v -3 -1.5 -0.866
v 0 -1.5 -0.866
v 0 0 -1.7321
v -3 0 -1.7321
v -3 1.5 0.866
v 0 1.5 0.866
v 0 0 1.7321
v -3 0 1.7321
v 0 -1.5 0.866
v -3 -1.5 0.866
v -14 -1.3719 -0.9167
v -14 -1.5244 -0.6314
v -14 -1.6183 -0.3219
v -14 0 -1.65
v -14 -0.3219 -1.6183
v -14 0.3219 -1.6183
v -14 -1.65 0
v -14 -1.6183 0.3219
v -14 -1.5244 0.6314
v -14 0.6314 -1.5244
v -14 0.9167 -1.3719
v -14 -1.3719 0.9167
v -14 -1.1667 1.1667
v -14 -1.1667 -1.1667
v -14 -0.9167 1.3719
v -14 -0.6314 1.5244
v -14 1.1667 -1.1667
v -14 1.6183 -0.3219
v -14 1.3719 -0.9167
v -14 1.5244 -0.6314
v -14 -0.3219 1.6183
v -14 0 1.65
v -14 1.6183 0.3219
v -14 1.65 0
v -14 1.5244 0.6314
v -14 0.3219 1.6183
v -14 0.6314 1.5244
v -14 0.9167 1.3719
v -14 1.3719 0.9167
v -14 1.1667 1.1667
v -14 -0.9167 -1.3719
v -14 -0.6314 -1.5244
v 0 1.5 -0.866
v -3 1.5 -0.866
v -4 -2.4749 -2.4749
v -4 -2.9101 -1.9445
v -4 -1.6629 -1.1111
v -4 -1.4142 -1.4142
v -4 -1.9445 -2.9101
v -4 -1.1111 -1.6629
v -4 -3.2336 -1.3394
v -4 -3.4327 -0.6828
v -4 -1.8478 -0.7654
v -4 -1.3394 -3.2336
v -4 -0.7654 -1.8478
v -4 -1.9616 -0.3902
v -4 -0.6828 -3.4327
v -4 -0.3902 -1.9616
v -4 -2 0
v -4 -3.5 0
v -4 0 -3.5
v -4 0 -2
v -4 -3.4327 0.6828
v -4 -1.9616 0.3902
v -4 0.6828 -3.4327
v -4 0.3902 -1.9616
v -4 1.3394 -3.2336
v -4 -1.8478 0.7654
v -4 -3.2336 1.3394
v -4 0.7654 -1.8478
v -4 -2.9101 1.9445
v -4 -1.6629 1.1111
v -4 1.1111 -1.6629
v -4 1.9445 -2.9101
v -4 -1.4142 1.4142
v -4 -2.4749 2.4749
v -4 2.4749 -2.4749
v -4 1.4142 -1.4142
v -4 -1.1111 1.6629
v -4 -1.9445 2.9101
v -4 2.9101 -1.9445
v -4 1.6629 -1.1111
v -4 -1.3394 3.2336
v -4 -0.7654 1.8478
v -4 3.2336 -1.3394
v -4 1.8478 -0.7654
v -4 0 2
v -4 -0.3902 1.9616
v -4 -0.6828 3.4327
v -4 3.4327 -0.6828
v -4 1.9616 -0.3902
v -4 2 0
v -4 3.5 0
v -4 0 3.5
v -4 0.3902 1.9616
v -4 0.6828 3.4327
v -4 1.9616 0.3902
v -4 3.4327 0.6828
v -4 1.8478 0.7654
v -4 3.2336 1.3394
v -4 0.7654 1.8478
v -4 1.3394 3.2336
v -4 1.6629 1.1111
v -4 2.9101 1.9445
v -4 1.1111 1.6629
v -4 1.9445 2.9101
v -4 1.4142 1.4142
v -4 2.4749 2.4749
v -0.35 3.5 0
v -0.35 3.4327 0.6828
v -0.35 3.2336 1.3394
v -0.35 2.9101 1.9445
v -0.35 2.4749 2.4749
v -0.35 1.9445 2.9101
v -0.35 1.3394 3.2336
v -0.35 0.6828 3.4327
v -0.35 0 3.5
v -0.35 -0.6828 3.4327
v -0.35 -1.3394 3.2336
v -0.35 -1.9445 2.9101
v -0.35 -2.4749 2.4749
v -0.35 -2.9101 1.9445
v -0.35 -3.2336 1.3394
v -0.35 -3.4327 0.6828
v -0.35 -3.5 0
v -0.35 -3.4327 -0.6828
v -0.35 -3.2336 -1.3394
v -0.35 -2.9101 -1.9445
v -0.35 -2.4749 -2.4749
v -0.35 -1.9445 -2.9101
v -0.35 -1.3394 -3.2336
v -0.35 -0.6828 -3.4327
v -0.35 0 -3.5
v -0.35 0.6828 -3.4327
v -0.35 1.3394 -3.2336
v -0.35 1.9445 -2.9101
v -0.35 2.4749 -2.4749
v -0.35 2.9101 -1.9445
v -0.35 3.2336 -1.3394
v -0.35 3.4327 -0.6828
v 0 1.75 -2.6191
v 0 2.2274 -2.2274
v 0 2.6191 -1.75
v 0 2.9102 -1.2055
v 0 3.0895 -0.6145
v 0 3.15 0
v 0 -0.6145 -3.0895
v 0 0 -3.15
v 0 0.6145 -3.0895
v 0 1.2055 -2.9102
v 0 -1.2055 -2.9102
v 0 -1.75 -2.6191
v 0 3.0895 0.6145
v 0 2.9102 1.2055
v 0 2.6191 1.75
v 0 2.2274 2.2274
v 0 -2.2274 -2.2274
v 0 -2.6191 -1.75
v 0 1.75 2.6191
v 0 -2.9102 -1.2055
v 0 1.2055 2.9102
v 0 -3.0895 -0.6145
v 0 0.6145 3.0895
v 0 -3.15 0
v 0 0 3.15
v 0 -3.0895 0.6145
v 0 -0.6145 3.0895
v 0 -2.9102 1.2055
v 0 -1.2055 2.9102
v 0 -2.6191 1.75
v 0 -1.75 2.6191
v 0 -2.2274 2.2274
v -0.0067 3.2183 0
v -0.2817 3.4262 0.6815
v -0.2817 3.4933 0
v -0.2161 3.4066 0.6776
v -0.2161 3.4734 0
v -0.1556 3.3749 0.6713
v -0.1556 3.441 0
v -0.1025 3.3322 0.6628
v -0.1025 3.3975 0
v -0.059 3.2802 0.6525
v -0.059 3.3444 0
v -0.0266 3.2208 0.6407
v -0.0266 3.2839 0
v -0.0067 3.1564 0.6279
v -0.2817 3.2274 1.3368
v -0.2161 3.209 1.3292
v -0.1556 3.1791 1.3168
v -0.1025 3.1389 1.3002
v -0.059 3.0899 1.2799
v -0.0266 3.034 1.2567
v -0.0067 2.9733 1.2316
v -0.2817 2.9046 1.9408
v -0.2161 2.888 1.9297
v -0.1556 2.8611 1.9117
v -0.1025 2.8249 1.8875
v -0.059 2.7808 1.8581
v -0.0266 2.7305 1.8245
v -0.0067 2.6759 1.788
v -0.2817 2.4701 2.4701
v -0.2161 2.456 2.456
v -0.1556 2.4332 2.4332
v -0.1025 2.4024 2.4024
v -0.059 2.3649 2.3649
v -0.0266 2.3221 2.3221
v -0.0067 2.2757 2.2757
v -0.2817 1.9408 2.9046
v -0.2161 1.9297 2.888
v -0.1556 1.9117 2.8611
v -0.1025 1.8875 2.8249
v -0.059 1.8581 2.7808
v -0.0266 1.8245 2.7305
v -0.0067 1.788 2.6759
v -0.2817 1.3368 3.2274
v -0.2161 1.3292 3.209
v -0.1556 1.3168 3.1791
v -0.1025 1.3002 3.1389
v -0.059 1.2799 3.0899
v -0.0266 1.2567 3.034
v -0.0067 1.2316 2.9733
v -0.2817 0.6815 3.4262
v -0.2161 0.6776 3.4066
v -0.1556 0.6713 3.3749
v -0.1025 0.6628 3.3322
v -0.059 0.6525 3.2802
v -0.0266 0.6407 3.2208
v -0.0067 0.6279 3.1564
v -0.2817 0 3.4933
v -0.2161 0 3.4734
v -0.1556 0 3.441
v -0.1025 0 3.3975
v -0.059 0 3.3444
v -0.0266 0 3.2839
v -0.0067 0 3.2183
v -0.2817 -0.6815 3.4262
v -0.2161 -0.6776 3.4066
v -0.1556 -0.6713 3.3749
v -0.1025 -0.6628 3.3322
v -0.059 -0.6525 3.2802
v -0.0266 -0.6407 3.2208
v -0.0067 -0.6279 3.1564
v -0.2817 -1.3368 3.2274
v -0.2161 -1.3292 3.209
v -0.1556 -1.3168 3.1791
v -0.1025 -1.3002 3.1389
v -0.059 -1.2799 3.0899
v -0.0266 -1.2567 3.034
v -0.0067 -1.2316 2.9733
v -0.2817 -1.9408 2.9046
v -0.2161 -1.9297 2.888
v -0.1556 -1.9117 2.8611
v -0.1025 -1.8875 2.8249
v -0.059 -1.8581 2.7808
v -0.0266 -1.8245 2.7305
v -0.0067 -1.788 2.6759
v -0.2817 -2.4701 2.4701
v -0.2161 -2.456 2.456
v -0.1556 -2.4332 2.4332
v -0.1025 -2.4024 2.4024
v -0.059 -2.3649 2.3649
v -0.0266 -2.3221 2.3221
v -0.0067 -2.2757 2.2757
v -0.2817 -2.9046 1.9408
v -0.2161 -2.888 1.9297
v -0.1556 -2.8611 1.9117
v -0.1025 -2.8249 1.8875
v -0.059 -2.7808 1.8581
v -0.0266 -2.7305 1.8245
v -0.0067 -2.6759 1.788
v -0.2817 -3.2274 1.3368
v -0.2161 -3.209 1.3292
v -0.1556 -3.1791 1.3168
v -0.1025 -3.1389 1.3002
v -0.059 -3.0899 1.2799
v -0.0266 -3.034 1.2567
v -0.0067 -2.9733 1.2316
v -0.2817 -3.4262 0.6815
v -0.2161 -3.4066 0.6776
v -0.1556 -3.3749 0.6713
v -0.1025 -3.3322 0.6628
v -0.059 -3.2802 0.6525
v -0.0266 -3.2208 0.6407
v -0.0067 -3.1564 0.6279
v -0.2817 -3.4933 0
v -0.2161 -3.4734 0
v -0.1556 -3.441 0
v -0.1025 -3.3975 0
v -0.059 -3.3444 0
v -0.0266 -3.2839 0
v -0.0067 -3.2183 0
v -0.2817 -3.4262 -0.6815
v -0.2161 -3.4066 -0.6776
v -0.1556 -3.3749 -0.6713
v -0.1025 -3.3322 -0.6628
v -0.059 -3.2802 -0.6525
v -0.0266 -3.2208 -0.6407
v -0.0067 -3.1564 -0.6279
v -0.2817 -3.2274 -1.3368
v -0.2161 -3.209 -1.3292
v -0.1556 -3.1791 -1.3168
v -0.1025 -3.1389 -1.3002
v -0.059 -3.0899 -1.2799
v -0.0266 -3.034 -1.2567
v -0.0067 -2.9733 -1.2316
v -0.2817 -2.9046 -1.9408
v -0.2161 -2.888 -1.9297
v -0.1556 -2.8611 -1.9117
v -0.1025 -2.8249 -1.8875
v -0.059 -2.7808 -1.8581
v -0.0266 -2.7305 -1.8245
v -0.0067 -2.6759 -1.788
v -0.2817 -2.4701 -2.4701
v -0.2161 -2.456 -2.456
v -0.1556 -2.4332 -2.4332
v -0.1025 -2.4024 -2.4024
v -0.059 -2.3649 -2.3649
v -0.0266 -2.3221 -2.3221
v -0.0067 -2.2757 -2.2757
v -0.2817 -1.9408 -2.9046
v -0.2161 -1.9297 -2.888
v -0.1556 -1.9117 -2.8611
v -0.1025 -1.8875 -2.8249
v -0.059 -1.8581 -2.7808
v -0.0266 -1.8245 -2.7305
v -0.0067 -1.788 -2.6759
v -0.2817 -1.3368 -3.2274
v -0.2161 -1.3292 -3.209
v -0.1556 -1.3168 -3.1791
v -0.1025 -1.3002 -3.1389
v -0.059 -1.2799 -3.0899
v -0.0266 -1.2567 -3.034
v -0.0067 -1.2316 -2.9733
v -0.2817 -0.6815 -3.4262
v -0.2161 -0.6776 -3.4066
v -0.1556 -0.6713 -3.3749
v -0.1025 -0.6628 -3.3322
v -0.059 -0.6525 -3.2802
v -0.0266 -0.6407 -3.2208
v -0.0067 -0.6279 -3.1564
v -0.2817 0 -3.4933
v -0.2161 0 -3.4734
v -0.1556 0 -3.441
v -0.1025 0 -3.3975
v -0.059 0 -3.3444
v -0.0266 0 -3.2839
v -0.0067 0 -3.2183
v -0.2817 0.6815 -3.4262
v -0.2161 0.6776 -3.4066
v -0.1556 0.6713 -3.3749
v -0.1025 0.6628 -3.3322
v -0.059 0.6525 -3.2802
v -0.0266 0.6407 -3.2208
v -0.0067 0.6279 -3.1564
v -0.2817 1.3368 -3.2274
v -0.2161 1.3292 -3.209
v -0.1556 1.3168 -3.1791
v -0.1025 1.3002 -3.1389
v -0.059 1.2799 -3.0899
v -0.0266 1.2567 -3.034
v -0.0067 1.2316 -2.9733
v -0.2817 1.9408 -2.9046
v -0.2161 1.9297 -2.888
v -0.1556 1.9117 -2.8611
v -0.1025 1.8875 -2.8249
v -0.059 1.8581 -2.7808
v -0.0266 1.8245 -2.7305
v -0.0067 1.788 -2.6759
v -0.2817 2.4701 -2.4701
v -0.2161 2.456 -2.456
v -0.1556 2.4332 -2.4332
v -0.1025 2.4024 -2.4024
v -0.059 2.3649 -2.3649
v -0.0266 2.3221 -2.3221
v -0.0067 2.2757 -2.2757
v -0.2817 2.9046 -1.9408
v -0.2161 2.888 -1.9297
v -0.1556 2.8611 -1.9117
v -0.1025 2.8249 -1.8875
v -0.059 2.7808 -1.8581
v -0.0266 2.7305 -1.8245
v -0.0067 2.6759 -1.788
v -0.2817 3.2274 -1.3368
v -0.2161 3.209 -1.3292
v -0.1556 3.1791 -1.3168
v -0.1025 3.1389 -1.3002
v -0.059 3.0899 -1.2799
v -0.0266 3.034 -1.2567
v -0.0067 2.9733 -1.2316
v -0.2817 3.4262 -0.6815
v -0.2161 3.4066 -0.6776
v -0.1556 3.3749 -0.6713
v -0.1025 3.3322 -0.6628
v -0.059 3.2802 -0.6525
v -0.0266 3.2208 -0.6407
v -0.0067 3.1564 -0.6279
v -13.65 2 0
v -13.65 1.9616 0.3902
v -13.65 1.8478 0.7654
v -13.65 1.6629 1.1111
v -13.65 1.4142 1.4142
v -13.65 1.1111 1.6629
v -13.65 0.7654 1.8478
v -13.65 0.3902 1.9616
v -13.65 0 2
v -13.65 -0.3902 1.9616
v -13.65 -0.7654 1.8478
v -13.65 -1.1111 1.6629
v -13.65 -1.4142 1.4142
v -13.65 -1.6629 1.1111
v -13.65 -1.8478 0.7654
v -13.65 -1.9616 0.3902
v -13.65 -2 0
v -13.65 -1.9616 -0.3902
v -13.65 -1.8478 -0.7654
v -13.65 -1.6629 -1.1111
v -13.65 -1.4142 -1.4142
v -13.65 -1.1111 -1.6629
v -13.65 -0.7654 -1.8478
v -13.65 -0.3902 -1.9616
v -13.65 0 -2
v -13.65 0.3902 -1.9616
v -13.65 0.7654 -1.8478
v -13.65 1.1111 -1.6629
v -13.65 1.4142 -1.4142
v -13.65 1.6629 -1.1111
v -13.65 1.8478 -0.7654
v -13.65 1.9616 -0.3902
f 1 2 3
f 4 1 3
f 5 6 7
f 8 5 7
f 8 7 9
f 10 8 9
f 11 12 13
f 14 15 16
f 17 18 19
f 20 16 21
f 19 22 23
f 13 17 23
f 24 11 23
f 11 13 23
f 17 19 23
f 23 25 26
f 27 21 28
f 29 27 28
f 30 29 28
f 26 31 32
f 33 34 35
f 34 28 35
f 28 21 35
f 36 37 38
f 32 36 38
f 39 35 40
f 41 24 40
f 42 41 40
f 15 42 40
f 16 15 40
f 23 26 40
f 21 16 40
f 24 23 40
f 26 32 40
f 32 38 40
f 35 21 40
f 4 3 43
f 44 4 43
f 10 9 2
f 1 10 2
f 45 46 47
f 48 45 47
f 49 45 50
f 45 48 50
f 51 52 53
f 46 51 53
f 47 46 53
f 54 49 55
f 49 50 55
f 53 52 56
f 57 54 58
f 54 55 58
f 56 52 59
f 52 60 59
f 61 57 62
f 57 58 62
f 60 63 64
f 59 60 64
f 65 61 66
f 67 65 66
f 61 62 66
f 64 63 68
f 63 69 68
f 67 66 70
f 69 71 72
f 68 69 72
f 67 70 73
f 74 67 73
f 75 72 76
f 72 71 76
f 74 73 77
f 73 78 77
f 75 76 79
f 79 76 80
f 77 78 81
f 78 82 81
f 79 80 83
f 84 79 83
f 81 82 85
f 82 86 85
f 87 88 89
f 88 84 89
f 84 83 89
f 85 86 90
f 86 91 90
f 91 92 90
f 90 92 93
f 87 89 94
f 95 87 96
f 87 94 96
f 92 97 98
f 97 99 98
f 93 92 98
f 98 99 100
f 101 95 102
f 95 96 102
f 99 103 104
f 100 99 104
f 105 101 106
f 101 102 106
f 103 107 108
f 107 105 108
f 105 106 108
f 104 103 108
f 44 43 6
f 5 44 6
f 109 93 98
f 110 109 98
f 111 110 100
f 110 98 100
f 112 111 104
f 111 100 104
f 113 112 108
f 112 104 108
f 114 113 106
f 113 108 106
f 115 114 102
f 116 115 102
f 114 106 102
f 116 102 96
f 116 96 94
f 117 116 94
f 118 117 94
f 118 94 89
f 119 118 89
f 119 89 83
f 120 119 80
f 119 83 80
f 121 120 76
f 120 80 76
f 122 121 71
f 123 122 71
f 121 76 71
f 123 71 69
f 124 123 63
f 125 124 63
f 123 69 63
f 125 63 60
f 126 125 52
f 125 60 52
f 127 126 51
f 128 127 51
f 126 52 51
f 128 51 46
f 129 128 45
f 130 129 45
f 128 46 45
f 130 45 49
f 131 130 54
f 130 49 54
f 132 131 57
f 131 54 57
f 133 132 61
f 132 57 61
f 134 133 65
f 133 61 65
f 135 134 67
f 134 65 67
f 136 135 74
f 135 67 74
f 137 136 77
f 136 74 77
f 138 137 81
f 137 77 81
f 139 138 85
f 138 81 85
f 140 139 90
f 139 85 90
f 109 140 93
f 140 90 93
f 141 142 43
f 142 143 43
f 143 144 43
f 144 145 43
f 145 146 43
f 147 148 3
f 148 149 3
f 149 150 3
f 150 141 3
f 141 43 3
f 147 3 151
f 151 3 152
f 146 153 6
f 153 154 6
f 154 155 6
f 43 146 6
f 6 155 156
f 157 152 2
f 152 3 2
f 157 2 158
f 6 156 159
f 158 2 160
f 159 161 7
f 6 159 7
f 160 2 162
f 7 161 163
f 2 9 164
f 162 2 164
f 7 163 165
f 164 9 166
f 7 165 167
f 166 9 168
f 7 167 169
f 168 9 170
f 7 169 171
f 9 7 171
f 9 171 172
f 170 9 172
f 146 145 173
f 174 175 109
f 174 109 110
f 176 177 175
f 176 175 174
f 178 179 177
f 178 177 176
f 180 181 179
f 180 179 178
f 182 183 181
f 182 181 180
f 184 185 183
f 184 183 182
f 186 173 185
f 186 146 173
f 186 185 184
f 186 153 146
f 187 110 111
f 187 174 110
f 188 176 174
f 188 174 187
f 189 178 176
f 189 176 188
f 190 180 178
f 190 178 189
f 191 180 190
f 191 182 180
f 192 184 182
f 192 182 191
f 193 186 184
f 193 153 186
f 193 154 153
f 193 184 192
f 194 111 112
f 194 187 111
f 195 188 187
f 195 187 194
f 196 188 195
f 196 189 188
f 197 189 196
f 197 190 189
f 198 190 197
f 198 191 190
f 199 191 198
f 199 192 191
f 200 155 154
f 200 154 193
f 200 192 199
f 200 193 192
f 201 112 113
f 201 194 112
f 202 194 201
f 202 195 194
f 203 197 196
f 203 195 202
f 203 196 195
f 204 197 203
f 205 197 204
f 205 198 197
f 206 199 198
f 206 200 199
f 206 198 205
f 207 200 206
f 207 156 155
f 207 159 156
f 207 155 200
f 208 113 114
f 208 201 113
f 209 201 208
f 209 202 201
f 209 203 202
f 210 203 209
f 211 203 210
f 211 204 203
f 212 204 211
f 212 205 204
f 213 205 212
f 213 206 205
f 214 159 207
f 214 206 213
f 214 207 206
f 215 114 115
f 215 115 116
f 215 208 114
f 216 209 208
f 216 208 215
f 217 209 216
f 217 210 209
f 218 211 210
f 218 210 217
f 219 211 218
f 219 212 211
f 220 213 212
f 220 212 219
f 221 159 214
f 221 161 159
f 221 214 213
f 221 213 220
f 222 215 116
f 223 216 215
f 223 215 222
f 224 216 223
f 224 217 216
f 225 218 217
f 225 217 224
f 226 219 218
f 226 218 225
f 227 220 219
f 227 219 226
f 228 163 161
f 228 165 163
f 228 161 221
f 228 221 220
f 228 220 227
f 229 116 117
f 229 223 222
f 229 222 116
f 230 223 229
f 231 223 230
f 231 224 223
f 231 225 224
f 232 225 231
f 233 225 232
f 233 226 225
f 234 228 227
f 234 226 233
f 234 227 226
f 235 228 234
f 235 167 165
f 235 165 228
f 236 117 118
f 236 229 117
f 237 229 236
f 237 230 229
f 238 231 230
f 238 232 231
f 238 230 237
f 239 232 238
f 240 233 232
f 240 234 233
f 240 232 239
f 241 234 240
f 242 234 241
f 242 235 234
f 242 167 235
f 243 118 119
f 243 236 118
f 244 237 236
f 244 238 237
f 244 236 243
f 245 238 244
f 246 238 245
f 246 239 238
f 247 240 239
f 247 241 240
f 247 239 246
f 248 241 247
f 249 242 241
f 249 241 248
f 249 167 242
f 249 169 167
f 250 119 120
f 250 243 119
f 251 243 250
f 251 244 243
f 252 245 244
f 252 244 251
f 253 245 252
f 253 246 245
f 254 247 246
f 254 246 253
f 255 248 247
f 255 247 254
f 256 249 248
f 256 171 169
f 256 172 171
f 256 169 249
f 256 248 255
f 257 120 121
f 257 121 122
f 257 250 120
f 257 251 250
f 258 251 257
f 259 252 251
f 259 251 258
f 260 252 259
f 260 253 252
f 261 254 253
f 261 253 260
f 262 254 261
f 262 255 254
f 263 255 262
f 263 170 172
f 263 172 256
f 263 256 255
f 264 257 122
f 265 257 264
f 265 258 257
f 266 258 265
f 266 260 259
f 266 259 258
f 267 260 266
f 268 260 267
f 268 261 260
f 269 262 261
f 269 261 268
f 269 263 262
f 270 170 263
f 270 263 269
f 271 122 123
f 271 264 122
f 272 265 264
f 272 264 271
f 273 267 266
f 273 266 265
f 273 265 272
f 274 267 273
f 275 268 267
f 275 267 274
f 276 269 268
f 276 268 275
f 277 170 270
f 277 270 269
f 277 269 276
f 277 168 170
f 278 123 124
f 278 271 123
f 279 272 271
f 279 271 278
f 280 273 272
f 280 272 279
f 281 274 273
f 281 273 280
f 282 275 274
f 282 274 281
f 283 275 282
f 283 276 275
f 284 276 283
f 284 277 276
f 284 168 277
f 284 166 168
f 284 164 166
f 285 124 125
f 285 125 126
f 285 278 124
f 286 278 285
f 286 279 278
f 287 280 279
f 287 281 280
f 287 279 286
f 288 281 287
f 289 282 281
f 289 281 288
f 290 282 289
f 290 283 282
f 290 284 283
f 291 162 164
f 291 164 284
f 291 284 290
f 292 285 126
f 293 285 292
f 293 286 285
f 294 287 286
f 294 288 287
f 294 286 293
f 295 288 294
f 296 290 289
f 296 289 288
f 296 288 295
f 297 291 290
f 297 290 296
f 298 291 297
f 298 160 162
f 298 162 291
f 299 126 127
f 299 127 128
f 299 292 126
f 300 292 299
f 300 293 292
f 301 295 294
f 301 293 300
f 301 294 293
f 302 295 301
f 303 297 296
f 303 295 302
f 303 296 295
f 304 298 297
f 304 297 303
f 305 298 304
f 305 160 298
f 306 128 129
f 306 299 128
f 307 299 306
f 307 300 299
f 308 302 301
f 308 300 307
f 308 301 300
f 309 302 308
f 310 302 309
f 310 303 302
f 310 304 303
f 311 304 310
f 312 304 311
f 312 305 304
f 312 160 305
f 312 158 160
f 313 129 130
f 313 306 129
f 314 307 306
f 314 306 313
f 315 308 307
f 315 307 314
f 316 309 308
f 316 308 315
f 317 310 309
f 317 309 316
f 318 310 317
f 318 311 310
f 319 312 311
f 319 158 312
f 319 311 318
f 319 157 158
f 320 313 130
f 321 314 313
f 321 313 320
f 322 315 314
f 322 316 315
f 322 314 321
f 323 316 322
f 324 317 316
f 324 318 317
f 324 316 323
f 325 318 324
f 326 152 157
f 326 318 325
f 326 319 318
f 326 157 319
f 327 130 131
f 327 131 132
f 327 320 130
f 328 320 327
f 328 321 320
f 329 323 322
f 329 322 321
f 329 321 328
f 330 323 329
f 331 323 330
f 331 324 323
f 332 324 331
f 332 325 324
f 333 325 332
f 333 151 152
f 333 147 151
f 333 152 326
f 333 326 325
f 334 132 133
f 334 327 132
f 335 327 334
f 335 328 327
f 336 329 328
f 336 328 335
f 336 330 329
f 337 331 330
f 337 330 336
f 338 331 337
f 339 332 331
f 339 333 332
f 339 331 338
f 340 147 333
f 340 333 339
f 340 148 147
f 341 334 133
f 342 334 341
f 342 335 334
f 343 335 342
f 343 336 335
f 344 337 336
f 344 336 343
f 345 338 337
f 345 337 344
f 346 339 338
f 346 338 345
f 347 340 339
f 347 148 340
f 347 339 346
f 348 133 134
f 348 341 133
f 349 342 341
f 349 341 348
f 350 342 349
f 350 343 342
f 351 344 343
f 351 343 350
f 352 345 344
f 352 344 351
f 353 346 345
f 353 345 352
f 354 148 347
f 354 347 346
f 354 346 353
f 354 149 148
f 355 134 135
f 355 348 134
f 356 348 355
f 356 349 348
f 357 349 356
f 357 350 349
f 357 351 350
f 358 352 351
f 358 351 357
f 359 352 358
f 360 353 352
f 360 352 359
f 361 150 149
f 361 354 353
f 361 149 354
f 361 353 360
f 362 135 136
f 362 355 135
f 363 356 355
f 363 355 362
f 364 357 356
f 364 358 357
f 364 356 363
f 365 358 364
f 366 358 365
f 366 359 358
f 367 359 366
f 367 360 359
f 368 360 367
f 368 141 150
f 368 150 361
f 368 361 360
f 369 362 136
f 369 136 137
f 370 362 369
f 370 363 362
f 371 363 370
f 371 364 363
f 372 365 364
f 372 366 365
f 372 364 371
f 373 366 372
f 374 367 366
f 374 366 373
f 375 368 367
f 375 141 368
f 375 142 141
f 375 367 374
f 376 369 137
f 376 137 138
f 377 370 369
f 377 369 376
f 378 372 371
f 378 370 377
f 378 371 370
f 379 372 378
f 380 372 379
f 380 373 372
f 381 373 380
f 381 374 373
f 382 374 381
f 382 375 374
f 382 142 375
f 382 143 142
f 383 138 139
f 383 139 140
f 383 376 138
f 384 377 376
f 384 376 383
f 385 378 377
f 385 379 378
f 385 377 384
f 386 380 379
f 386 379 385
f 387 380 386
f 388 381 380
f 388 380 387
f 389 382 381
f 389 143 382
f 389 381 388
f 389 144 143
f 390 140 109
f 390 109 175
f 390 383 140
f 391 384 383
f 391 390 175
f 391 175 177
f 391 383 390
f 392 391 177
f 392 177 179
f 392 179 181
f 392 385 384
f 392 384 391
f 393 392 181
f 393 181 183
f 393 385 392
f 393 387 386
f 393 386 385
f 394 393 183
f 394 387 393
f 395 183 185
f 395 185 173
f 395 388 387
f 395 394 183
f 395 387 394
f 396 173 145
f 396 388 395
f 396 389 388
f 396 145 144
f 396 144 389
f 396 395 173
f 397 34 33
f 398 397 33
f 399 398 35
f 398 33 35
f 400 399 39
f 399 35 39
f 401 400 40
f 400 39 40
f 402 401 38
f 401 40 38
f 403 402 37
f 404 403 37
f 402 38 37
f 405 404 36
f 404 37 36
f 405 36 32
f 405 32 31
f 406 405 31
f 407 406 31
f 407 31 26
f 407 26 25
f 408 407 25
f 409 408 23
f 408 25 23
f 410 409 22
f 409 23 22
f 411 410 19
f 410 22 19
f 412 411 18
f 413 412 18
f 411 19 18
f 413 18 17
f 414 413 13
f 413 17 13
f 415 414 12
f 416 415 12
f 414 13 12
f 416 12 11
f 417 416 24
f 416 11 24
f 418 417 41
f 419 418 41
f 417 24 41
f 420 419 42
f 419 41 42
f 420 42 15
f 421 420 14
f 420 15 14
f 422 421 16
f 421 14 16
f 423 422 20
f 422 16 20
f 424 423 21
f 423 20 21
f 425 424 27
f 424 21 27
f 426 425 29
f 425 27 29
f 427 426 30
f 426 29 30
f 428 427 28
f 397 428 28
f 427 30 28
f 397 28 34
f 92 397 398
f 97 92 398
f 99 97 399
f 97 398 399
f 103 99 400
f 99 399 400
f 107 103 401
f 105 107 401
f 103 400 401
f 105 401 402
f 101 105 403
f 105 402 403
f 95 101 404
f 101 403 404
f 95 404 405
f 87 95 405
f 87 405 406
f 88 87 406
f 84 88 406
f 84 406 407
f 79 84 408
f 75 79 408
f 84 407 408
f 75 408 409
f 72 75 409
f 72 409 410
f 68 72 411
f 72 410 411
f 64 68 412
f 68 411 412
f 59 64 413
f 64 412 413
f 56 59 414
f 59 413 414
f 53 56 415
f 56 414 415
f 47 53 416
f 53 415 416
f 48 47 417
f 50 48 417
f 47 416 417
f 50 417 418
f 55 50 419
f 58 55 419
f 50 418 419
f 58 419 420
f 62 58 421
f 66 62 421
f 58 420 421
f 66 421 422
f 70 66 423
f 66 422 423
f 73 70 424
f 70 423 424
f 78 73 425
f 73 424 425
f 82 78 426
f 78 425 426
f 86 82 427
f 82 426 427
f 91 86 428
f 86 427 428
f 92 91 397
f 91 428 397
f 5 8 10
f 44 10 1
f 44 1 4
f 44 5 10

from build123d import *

# Parameters (mm, degrees)
SFAZOWANIE1_SIZE           = 0.35
ZAOKR_GLENIE1_R            = 0.35
WYTNIJ_WYCI_GNI_CIE1_DEPTH = 3


with BuildPart() as part:
    # Szkic1 → Obrót1 (revolve)
    with BuildSketch(Plane.XY):
        Polygon((0, 0), (0, 3.5), (-4, 3.5), (-4, 2), (-14, 2), (-14, 0), align=None)
    revolve(axis=Axis((-123.158940217, 0, 0), (1, 0, 0)))

    # Sfazowanie1
    sfazowanie1_edges = [part.edges().sort_by_distance(p)[0] for p in [
        (-14, -2, 0),
    ]]
    chamfer(sfazowanie1_edges, length=SFAZOWANIE1_SIZE)

    # Zaokrąglenie1
    zaokr_glenie1_edges = [part.edges().sort_by_distance(p)[0] for p in [
        (0, -3.5, 0),
    ]]
    fillet(zaokr_glenie1_edges, radius=ZAOKR_GLENIE1_R)

    # Szkic2 → Wytnij-wyciągnięcie1 (cut)
    with BuildSketch(Plane(origin=(0, 0, 0), x_dir=(0, 0, -1), z_dir=(1, 0, 0))):
        Polygon((1.732050808, 0), (0.866025404, 1.5), (-0.866025404, 1.5), (-1.732050808, 0), (-0.866025404, -1.5), (0.866025404, -1.5), align=None)
    extrude(amount=-WYTNIJ_WYCI_GNI_CIE1_DEPTH, mode=Mode.SUBTRACT)


solid = part.part
